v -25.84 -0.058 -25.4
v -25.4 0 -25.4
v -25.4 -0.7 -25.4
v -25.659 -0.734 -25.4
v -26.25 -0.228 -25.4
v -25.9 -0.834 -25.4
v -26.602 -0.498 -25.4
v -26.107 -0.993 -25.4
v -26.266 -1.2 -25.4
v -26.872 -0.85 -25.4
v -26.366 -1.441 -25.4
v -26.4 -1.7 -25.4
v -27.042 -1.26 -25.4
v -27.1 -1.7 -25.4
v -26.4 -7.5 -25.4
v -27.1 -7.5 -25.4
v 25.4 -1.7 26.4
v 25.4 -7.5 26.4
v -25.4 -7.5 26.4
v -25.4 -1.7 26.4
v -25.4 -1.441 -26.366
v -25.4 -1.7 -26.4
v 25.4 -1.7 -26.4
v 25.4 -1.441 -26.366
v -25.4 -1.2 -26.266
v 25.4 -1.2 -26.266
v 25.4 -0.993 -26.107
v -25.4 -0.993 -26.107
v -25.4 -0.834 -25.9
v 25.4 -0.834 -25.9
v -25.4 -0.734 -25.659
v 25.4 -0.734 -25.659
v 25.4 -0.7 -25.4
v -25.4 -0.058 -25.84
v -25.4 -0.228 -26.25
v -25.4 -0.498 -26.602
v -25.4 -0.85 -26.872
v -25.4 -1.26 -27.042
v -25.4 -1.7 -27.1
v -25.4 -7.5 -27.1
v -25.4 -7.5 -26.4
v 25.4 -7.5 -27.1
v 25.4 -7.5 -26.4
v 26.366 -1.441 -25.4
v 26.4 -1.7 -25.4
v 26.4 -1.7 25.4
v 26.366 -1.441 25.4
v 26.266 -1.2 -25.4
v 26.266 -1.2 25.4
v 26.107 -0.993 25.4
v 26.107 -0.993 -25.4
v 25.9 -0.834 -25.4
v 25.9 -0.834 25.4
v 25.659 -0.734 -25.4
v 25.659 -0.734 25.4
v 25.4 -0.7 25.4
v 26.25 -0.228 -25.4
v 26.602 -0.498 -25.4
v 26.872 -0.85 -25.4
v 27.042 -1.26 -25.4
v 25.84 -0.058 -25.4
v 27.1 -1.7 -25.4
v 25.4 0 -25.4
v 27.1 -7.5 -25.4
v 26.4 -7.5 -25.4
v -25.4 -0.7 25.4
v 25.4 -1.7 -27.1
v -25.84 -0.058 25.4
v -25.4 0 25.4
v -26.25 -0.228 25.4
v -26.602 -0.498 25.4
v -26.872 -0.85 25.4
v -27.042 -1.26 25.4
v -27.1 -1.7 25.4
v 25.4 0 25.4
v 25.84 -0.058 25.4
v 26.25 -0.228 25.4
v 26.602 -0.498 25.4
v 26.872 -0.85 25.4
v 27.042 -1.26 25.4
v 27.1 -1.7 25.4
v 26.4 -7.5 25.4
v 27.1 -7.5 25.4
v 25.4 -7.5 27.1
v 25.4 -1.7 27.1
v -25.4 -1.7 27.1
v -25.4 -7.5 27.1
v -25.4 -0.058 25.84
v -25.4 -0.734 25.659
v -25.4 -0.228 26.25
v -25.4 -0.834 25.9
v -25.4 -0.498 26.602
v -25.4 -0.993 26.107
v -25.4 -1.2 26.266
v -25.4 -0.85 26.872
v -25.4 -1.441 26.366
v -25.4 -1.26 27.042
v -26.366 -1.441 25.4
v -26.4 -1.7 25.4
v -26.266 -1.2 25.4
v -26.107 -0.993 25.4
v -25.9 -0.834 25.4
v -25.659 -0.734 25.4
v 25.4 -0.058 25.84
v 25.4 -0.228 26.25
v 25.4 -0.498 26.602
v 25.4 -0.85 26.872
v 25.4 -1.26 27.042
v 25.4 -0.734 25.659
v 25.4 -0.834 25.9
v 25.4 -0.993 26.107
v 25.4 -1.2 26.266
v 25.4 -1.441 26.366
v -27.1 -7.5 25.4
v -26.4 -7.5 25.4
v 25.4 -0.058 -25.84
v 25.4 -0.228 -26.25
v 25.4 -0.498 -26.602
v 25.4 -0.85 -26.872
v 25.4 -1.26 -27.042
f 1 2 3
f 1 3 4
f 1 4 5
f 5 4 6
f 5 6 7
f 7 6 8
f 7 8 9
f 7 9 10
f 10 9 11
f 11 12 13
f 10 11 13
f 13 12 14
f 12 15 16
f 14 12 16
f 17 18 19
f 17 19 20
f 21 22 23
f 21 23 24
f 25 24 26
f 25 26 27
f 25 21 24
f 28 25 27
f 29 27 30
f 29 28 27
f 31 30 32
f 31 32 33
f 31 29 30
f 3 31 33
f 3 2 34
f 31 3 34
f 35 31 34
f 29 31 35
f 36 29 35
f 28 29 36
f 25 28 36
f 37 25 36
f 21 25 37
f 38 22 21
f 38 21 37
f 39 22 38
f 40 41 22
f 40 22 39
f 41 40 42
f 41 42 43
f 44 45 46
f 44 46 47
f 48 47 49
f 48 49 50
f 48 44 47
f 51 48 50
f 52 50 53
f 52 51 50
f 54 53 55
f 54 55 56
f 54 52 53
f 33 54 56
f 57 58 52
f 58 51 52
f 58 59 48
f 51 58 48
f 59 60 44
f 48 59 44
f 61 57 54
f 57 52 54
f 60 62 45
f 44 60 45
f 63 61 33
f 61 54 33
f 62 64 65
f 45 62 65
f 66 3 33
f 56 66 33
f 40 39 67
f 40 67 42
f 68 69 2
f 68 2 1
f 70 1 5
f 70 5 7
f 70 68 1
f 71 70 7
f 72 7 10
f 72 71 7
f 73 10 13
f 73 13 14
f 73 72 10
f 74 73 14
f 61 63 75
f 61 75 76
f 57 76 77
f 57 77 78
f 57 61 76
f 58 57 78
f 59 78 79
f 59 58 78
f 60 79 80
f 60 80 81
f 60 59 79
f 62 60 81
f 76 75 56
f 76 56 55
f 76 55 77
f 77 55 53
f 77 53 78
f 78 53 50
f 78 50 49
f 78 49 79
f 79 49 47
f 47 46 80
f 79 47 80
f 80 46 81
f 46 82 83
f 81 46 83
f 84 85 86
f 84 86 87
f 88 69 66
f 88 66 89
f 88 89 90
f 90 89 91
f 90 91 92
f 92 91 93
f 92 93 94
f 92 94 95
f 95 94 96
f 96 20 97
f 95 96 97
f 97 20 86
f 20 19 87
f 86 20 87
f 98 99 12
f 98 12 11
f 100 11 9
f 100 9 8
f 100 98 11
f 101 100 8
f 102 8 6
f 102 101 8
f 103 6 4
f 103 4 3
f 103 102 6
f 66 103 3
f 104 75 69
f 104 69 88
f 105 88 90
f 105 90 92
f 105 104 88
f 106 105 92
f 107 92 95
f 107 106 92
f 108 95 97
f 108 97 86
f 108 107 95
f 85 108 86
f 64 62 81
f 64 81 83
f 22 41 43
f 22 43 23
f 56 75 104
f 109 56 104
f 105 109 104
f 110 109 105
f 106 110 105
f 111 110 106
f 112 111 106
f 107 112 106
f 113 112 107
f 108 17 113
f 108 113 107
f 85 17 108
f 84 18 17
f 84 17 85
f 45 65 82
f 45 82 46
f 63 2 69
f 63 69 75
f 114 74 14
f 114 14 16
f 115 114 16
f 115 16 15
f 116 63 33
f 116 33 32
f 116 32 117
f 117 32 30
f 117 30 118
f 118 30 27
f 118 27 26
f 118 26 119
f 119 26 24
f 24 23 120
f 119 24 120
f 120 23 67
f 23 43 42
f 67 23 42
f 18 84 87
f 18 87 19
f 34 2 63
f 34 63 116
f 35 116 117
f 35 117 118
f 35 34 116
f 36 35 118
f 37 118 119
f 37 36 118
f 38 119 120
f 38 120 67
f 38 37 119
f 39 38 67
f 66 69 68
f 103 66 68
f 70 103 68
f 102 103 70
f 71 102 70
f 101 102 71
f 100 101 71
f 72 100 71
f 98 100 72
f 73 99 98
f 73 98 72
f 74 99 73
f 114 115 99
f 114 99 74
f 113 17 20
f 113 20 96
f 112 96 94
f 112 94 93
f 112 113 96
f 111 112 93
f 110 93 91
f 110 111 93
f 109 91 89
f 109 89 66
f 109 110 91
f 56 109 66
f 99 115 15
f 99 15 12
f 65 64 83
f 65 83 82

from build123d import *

# Parameters (mm, degrees)
SKETCH1_W          = 50.8
SKETCH1_H          = 50.8
BASE_FLANGE1_DEPTH = 0.7
EDGE_FLANGE1_DEPTH = 50.8
EDGE_FLANGE2_DEPTH = 50.8
EDGE_FLANGE3_DEPTH = 50.8
EDGE_FLANGE4_DEPTH = 50.8


# Sheet-metal steps are written as plain solids
with BuildPart() as part:
    # Sketch1 → Base-Flange1 (new body)
    with BuildSketch(Plane(origin=(0, 0, 0), x_dir=(1, 0, 0), z_dir=(0, 1, 0))):
        Rectangle(SKETCH1_W, SKETCH1_H)
    extrude(amount=-BASE_FLANGE1_DEPTH)

    # Edge-Flange1 section (across the edge) → Edge-Flange1 (add)
    with BuildSketch(Plane(origin=(26.4, -0.7, -25.4), x_dir=(-1, 0, 0), z_dir=(0, 0, 1))):
        with BuildLine():
            Line((-0.7, 1), (-0.7, 6.8))
            Line((-0.7, 6.8), (0, 6.8))
            Line((0, 6.8), (0, 1))
            ThreePointArc((0, 1), (0.292893219, 0.292893219), (1, 0))
            Line((1, 0), (1, -0.7))
            ThreePointArc((1, -0.7), (-0.202081528, -0.202081528), (-0.7, 1))
        make_face()
    extrude(amount=EDGE_FLANGE1_DEPTH)

    # Edge-Flange2 section (across the edge) → Edge-Flange2 (add)
    with BuildSketch(Plane(origin=(25.4, -0.7, 26.4), x_dir=(0, 0, -1), z_dir=(-1, 0, 0))):
        with BuildLine():
            Line((-0.7, 1), (-0.7, 6.8))
            Line((-0.7, 6.8), (0, 6.8))
            Line((0, 6.8), (0, 1))
            ThreePointArc((0, 1), (0.292893219, 0.292893219), (1, 0))
            Line((1, 0), (1, -0.7))
            ThreePointArc((1, -0.7), (-0.202081528, -0.202081528), (-0.7, 1))
        make_face()
    extrude(amount=EDGE_FLANGE2_DEPTH)

    # Edge-Flange3 section (across the edge) → Edge-Flange3 (add)
    with BuildSketch(Plane(origin=(-26.4, -0.7, 25.4), x_dir=(1, 0, 0), z_dir=(0, 0, -1))):
        with BuildLine():
            Line((-0.7, 1), (-0.7, 6.8))
            Line((-0.7, 6.8), (0, 6.8))
            Line((0, 6.8), (0, 1))
            ThreePointArc((0, 1), (0.292893219, 0.292893219), (1, 0))
            Line((1, 0), (1, -0.7))
            ThreePointArc((1, -0.7), (-0.202081528, -0.202081528), (-0.7, 1))
        make_face()
    extrude(amount=EDGE_FLANGE3_DEPTH)

    # Edge-Flange4 section (across the edge) → Edge-Flange4 (add)
    with BuildSketch(Plane(origin=(-25.4, -0.7, -26.4), x_dir=(0, 0, 1), z_dir=(1, 0, 0))):
        with BuildLine():
            Line((-0.7, 1), (-0.7, 6.8))
            Line((-0.7, 6.8), (0, 6.8))
            Line((0, 6.8), (0, 1))
            ThreePointArc((0, 1), (0.292893219, 0.292893219), (1, 0))
            Line((1, 0), (1, -0.7))
            ThreePointArc((1, -0.7), (-0.202081528, -0.202081528), (-0.7, 1))
        make_face()
    extrude(amount=EDGE_FLANGE4_DEPTH)


solid = part.part
